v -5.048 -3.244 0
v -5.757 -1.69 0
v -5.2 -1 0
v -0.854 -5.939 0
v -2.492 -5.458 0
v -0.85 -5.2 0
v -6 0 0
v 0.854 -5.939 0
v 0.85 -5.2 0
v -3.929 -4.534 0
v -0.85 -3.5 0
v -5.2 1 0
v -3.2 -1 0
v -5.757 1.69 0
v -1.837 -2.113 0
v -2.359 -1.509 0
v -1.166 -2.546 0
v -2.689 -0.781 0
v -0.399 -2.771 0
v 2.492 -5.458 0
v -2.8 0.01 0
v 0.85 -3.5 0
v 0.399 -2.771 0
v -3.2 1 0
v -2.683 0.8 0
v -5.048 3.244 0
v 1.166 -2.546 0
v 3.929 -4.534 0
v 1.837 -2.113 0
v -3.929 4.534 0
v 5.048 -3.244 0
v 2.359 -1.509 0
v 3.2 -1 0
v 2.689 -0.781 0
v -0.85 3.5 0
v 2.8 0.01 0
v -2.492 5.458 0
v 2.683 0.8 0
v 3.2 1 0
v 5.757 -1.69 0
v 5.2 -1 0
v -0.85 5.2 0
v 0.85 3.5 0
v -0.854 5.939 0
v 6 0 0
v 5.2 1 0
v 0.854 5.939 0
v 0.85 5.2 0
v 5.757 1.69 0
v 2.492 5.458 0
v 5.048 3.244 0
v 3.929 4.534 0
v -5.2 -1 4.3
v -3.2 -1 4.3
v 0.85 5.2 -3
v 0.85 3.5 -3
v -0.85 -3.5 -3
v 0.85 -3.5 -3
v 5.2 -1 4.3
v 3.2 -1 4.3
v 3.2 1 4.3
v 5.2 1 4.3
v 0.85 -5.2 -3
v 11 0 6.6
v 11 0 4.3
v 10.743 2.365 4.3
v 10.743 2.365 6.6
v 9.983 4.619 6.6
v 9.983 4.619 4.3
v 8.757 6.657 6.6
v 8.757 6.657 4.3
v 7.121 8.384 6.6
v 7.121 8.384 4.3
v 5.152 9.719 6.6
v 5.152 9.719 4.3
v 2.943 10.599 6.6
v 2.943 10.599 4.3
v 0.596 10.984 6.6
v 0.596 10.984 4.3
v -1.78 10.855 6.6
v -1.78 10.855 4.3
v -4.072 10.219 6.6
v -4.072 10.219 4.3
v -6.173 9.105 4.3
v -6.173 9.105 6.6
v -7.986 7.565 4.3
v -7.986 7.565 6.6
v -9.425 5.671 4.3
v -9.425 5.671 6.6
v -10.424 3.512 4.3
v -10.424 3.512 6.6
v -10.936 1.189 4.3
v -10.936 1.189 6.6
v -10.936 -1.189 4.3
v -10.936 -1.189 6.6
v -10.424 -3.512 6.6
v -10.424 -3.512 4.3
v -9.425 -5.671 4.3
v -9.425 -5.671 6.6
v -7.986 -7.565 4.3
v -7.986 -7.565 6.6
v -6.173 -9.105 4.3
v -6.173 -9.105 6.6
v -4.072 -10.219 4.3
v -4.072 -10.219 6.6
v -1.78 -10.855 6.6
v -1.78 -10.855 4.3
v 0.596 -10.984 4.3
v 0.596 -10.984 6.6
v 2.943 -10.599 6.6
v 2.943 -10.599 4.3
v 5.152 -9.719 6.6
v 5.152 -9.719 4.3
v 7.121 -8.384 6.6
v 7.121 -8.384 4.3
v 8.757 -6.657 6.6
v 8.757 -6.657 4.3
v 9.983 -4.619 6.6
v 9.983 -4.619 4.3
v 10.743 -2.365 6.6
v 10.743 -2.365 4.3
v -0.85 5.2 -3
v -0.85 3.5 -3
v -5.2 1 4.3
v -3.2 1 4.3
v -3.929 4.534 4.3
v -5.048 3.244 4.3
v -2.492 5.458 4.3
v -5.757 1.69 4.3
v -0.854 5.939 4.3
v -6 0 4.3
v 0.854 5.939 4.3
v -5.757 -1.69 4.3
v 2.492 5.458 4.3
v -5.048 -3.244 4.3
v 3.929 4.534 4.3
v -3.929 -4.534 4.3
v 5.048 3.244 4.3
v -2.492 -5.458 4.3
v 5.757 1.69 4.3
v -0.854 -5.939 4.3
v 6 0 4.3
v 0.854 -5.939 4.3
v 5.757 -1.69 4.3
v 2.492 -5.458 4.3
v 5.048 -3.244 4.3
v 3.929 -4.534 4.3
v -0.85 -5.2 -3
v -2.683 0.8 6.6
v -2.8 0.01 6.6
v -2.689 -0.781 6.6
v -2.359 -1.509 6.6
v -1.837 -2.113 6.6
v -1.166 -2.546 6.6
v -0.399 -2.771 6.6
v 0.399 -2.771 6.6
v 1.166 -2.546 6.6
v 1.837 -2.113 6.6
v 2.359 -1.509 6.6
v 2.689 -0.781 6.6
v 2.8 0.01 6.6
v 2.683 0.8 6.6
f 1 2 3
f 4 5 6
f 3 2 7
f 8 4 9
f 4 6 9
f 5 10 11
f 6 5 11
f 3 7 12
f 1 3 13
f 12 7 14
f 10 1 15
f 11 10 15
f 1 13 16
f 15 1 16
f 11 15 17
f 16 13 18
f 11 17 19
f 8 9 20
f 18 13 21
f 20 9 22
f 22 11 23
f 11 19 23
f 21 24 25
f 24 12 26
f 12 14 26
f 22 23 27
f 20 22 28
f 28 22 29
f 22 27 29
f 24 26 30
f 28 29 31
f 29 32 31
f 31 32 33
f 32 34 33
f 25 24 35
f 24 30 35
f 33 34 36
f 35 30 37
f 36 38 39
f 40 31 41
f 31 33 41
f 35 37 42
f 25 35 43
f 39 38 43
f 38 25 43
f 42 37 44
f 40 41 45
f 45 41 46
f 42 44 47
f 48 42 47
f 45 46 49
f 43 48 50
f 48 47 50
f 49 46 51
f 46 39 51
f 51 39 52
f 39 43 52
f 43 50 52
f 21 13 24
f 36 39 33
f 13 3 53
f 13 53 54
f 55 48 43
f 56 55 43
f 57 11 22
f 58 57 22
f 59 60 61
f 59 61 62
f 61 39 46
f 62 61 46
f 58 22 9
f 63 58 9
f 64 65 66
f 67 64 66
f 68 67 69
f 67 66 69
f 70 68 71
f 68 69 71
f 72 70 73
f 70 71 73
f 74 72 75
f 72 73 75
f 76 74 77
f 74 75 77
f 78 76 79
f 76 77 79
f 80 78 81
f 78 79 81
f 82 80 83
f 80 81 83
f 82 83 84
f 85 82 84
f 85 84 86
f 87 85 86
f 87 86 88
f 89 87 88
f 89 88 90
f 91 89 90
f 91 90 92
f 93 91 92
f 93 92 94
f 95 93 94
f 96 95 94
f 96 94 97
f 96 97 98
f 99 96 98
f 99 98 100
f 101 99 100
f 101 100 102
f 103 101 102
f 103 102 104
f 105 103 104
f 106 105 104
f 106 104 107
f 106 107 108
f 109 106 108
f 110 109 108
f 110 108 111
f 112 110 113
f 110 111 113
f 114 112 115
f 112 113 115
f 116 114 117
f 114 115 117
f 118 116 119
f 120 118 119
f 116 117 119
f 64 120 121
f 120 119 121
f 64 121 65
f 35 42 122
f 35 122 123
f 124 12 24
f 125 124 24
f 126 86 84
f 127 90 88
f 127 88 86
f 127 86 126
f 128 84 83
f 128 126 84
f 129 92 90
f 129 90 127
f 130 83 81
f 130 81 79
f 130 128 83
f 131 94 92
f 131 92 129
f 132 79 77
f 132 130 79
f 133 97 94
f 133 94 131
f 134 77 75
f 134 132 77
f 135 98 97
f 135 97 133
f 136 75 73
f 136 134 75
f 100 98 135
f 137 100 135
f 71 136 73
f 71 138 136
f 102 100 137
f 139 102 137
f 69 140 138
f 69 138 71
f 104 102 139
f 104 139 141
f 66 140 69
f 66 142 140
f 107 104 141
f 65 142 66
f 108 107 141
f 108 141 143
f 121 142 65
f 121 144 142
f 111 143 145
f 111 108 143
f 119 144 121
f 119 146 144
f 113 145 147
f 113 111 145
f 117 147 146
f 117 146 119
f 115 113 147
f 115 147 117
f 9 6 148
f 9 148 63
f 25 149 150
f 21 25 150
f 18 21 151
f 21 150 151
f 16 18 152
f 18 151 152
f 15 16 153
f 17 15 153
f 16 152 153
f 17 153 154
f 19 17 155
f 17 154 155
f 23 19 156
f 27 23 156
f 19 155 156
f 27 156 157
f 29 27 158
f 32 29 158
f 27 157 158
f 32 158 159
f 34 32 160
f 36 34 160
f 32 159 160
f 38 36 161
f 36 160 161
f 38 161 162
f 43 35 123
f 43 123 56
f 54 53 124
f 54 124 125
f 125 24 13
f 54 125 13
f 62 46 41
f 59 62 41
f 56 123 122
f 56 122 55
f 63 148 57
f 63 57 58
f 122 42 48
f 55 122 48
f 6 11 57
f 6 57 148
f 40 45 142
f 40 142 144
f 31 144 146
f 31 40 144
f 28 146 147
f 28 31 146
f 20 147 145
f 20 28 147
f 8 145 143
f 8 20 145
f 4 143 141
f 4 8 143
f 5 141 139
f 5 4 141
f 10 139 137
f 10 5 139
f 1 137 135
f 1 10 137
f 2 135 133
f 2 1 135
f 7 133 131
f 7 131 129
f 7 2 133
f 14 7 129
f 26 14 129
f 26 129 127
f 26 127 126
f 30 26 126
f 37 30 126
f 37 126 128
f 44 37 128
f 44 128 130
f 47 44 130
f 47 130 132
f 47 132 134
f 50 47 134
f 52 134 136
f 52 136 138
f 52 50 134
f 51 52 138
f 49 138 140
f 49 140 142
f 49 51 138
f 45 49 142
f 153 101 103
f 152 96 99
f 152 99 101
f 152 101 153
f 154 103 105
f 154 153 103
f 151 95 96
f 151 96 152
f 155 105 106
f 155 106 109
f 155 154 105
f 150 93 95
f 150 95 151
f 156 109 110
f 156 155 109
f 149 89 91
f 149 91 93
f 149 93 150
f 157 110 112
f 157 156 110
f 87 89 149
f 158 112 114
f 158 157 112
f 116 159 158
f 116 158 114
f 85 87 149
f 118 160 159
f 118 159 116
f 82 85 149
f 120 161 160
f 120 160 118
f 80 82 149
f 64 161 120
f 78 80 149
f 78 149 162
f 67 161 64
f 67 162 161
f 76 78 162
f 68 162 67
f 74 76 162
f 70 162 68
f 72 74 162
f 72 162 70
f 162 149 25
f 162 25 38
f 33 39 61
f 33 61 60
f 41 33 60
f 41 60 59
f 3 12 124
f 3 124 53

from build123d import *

# Parameters (mm, degrees)
SKETCH_R        = 11
PAD_DEPTH       = 6.6
SKETCH001_R     = 11
SKETCH001_R_2   = 6
POCKET_DEPTH    = 4.3
POCKET001_DEPTH = 6.601
SKETCH003_W     = 1.7
SKETCH003_H     = 1.7
PAD001_DEPTH    = 3
SKETCH004_W     = 2
SKETCH004_H     = 2
POCKET002_DEPTH = 4.3


with BuildPart() as part:
    # Sketch → Pad (new body)
    with BuildSketch(Plane.XY):
        Circle(SKETCH_R)
    extrude(amount=PAD_DEPTH)

    # Sketch001 → Pocket (cut)
    with BuildSketch(Plane(origin=(0, 0, 0), x_dir=(1, 0, 0), z_dir=(0, 0, -1))):
        Circle(SKETCH001_R)
        Circle(SKETCH001_R_2, mode=Mode.SUBTRACT)
    extrude(amount=-POCKET_DEPTH, mode=Mode.SUBTRACT)

    # Sketch002 → Pocket001 (cut, through all)
    with BuildSketch(Plane.XY.offset(6.6)):
        with BuildLine():
            Line((-2.683282, 0.8), (2.683282, 0.8))
            ThreePointArc((-2.683282, 0.8), (0, -2.8), (2.683282, 0.8))
        make_face()
    extrude(amount=-POCKET001_DEPTH, mode=Mode.SUBTRACT)

    # Sketch003 → Pad001 (new body)
    with BuildSketch(Plane(origin=(0, 0, 0), x_dir=(1, 0, 0), z_dir=(0, 0, -1))):
        with Locations((0, 4.35)):
            Rectangle(SKETCH003_W, SKETCH003_H)
        with Locations((0, -4.35)):
            Rectangle(SKETCH003_W, SKETCH003_H)
    extrude(amount=PAD001_DEPTH)

    # Sketch004 → Pocket002 (cut)
    with BuildSketch(Plane(origin=(0, 0, 0), x_dir=(1, 0, 0), z_dir=(0, 0, -1))):
        with Locations((-4.2, 0)):
            Rectangle(SKETCH004_W, SKETCH004_H)
        with Locations((4.2, 0)):
            Rectangle(SKETCH004_W, SKETCH004_H)
    extrude(amount=-POCKET002_DEPTH, mode=Mode.SUBTRACT)


solid = part.part
